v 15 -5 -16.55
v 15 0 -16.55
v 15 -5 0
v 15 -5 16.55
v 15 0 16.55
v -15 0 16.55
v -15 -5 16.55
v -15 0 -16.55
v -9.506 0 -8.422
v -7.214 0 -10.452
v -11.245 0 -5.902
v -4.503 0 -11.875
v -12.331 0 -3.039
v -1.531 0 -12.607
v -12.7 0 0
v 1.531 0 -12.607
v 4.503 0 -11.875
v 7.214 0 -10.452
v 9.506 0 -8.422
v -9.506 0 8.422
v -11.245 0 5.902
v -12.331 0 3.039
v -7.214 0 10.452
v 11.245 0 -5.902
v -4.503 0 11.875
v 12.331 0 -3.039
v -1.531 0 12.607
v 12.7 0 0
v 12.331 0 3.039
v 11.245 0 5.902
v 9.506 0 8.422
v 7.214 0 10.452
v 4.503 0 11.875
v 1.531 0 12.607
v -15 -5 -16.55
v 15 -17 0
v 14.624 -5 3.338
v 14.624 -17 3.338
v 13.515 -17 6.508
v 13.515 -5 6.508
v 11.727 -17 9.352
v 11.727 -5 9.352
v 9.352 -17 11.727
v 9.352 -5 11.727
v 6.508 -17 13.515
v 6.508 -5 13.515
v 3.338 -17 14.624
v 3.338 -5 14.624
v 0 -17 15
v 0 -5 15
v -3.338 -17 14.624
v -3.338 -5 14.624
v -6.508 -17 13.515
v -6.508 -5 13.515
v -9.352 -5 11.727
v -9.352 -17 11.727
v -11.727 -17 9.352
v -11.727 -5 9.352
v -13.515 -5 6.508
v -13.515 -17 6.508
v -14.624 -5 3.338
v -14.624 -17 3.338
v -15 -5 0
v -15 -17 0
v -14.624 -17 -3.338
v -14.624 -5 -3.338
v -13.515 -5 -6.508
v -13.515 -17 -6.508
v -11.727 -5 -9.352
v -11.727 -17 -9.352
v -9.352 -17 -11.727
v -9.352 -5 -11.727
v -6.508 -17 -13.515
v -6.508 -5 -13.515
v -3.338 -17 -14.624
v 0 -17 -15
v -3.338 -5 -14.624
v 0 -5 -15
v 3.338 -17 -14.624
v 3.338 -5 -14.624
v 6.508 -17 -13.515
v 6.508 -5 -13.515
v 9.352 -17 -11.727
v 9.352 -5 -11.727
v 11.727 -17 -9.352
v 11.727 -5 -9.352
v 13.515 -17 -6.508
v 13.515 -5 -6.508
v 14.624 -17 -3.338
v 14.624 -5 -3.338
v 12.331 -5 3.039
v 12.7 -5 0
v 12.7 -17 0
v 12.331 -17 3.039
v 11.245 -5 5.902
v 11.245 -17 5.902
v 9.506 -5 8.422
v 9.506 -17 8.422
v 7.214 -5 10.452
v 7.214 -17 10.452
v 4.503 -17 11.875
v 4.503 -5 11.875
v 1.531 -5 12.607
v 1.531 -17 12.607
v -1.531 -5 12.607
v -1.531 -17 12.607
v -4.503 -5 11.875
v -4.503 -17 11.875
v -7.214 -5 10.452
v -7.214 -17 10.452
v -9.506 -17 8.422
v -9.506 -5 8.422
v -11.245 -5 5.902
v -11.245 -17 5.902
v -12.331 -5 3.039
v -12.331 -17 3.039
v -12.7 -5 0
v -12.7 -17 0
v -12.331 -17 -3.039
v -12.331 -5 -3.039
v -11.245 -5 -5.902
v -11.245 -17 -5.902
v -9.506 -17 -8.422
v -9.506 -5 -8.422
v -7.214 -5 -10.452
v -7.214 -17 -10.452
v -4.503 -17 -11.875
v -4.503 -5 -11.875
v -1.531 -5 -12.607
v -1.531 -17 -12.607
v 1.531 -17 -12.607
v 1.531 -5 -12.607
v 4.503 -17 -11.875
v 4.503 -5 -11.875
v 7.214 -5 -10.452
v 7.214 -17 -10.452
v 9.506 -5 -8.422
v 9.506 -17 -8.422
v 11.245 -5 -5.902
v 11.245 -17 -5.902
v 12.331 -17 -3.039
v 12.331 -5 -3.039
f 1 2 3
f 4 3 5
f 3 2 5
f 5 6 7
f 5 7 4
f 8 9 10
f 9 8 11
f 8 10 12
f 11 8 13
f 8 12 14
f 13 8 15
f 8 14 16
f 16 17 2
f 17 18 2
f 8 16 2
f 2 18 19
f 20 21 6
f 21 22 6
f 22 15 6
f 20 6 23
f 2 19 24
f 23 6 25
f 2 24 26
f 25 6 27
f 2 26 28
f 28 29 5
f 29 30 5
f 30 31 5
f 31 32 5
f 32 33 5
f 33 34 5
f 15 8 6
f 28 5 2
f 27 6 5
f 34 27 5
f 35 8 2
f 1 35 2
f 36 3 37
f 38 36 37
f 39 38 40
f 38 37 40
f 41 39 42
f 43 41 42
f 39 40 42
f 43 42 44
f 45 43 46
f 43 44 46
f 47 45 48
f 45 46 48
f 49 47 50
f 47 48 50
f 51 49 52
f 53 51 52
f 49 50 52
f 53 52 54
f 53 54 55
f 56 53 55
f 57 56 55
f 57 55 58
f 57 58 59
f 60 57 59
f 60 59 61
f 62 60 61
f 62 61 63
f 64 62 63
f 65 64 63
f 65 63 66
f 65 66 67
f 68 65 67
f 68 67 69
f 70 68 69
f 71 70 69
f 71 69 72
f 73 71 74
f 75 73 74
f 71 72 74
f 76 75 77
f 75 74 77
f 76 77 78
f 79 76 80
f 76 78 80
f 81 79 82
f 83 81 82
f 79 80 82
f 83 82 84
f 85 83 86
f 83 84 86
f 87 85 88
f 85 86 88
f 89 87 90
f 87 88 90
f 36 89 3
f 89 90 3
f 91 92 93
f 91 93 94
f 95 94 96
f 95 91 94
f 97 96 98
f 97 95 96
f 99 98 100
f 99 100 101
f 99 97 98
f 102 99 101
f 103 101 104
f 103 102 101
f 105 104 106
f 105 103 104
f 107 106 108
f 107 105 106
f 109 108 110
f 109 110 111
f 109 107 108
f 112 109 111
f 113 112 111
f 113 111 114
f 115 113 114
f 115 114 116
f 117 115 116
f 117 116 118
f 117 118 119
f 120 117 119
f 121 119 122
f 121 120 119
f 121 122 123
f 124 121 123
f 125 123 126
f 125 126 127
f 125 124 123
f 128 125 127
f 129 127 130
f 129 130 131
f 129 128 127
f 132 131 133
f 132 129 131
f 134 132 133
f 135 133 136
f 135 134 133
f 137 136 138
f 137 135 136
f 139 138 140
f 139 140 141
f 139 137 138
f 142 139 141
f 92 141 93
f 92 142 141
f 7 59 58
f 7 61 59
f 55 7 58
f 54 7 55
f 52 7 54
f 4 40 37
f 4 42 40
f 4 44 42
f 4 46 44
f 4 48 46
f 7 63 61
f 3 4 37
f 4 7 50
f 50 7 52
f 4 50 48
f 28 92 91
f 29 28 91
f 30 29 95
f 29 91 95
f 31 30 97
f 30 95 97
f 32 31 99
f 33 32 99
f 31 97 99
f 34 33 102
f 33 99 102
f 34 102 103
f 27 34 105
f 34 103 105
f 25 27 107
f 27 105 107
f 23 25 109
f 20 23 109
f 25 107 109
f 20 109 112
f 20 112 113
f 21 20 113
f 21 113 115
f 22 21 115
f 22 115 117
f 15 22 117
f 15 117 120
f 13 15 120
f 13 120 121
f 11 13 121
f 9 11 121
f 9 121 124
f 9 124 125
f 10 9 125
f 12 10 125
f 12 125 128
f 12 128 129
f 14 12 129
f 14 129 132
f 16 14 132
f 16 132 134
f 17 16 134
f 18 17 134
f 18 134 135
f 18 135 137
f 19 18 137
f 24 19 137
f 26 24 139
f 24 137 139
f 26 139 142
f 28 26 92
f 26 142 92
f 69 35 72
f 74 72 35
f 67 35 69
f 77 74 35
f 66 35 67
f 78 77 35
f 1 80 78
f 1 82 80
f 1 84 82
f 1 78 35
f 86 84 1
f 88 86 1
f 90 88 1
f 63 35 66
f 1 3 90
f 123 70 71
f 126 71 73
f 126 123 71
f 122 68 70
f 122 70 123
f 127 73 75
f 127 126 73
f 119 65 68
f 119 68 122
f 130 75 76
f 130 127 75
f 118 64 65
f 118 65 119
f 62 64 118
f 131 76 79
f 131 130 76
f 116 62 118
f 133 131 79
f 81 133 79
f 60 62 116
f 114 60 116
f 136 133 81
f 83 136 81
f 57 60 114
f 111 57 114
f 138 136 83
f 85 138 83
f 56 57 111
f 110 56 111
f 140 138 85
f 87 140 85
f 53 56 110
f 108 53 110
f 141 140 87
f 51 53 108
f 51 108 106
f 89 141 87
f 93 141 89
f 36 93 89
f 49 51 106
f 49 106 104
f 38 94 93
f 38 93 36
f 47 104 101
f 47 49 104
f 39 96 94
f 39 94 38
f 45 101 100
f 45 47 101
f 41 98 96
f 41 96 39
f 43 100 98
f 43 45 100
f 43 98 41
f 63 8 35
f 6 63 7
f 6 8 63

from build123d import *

# Parameters (mm, degrees)
F0_W     = 30
F0_H     = 33.1
F1_DEPTH = 5
F2_R     = 15
F2_R_2   = 12.7
F3_DEPTH = 12
F4_R     = 12.7
F5_DEPTH = 25


with BuildPart() as f1:
    # F0 (on Front) → F1 (new body)
    with BuildSketch(Plane.XZ):
        Rectangle(F0_W, F0_H)
    extrude(amount=F1_DEPTH)

    # F2 (on face) → F3 (join)
    with BuildSketch(Plane.XZ.offset(5)):
        Circle(F2_R)
        Circle(F2_R_2, mode=Mode.SUBTRACT)
    extrude(amount=F3_DEPTH)

    # F4 (on face) → F5 (cut)
    with BuildSketch(Plane.XZ.offset(5)):
        Circle(F4_R)
    extrude(amount=-F5_DEPTH, mode=Mode.SUBTRACT)


solid = f1.part
